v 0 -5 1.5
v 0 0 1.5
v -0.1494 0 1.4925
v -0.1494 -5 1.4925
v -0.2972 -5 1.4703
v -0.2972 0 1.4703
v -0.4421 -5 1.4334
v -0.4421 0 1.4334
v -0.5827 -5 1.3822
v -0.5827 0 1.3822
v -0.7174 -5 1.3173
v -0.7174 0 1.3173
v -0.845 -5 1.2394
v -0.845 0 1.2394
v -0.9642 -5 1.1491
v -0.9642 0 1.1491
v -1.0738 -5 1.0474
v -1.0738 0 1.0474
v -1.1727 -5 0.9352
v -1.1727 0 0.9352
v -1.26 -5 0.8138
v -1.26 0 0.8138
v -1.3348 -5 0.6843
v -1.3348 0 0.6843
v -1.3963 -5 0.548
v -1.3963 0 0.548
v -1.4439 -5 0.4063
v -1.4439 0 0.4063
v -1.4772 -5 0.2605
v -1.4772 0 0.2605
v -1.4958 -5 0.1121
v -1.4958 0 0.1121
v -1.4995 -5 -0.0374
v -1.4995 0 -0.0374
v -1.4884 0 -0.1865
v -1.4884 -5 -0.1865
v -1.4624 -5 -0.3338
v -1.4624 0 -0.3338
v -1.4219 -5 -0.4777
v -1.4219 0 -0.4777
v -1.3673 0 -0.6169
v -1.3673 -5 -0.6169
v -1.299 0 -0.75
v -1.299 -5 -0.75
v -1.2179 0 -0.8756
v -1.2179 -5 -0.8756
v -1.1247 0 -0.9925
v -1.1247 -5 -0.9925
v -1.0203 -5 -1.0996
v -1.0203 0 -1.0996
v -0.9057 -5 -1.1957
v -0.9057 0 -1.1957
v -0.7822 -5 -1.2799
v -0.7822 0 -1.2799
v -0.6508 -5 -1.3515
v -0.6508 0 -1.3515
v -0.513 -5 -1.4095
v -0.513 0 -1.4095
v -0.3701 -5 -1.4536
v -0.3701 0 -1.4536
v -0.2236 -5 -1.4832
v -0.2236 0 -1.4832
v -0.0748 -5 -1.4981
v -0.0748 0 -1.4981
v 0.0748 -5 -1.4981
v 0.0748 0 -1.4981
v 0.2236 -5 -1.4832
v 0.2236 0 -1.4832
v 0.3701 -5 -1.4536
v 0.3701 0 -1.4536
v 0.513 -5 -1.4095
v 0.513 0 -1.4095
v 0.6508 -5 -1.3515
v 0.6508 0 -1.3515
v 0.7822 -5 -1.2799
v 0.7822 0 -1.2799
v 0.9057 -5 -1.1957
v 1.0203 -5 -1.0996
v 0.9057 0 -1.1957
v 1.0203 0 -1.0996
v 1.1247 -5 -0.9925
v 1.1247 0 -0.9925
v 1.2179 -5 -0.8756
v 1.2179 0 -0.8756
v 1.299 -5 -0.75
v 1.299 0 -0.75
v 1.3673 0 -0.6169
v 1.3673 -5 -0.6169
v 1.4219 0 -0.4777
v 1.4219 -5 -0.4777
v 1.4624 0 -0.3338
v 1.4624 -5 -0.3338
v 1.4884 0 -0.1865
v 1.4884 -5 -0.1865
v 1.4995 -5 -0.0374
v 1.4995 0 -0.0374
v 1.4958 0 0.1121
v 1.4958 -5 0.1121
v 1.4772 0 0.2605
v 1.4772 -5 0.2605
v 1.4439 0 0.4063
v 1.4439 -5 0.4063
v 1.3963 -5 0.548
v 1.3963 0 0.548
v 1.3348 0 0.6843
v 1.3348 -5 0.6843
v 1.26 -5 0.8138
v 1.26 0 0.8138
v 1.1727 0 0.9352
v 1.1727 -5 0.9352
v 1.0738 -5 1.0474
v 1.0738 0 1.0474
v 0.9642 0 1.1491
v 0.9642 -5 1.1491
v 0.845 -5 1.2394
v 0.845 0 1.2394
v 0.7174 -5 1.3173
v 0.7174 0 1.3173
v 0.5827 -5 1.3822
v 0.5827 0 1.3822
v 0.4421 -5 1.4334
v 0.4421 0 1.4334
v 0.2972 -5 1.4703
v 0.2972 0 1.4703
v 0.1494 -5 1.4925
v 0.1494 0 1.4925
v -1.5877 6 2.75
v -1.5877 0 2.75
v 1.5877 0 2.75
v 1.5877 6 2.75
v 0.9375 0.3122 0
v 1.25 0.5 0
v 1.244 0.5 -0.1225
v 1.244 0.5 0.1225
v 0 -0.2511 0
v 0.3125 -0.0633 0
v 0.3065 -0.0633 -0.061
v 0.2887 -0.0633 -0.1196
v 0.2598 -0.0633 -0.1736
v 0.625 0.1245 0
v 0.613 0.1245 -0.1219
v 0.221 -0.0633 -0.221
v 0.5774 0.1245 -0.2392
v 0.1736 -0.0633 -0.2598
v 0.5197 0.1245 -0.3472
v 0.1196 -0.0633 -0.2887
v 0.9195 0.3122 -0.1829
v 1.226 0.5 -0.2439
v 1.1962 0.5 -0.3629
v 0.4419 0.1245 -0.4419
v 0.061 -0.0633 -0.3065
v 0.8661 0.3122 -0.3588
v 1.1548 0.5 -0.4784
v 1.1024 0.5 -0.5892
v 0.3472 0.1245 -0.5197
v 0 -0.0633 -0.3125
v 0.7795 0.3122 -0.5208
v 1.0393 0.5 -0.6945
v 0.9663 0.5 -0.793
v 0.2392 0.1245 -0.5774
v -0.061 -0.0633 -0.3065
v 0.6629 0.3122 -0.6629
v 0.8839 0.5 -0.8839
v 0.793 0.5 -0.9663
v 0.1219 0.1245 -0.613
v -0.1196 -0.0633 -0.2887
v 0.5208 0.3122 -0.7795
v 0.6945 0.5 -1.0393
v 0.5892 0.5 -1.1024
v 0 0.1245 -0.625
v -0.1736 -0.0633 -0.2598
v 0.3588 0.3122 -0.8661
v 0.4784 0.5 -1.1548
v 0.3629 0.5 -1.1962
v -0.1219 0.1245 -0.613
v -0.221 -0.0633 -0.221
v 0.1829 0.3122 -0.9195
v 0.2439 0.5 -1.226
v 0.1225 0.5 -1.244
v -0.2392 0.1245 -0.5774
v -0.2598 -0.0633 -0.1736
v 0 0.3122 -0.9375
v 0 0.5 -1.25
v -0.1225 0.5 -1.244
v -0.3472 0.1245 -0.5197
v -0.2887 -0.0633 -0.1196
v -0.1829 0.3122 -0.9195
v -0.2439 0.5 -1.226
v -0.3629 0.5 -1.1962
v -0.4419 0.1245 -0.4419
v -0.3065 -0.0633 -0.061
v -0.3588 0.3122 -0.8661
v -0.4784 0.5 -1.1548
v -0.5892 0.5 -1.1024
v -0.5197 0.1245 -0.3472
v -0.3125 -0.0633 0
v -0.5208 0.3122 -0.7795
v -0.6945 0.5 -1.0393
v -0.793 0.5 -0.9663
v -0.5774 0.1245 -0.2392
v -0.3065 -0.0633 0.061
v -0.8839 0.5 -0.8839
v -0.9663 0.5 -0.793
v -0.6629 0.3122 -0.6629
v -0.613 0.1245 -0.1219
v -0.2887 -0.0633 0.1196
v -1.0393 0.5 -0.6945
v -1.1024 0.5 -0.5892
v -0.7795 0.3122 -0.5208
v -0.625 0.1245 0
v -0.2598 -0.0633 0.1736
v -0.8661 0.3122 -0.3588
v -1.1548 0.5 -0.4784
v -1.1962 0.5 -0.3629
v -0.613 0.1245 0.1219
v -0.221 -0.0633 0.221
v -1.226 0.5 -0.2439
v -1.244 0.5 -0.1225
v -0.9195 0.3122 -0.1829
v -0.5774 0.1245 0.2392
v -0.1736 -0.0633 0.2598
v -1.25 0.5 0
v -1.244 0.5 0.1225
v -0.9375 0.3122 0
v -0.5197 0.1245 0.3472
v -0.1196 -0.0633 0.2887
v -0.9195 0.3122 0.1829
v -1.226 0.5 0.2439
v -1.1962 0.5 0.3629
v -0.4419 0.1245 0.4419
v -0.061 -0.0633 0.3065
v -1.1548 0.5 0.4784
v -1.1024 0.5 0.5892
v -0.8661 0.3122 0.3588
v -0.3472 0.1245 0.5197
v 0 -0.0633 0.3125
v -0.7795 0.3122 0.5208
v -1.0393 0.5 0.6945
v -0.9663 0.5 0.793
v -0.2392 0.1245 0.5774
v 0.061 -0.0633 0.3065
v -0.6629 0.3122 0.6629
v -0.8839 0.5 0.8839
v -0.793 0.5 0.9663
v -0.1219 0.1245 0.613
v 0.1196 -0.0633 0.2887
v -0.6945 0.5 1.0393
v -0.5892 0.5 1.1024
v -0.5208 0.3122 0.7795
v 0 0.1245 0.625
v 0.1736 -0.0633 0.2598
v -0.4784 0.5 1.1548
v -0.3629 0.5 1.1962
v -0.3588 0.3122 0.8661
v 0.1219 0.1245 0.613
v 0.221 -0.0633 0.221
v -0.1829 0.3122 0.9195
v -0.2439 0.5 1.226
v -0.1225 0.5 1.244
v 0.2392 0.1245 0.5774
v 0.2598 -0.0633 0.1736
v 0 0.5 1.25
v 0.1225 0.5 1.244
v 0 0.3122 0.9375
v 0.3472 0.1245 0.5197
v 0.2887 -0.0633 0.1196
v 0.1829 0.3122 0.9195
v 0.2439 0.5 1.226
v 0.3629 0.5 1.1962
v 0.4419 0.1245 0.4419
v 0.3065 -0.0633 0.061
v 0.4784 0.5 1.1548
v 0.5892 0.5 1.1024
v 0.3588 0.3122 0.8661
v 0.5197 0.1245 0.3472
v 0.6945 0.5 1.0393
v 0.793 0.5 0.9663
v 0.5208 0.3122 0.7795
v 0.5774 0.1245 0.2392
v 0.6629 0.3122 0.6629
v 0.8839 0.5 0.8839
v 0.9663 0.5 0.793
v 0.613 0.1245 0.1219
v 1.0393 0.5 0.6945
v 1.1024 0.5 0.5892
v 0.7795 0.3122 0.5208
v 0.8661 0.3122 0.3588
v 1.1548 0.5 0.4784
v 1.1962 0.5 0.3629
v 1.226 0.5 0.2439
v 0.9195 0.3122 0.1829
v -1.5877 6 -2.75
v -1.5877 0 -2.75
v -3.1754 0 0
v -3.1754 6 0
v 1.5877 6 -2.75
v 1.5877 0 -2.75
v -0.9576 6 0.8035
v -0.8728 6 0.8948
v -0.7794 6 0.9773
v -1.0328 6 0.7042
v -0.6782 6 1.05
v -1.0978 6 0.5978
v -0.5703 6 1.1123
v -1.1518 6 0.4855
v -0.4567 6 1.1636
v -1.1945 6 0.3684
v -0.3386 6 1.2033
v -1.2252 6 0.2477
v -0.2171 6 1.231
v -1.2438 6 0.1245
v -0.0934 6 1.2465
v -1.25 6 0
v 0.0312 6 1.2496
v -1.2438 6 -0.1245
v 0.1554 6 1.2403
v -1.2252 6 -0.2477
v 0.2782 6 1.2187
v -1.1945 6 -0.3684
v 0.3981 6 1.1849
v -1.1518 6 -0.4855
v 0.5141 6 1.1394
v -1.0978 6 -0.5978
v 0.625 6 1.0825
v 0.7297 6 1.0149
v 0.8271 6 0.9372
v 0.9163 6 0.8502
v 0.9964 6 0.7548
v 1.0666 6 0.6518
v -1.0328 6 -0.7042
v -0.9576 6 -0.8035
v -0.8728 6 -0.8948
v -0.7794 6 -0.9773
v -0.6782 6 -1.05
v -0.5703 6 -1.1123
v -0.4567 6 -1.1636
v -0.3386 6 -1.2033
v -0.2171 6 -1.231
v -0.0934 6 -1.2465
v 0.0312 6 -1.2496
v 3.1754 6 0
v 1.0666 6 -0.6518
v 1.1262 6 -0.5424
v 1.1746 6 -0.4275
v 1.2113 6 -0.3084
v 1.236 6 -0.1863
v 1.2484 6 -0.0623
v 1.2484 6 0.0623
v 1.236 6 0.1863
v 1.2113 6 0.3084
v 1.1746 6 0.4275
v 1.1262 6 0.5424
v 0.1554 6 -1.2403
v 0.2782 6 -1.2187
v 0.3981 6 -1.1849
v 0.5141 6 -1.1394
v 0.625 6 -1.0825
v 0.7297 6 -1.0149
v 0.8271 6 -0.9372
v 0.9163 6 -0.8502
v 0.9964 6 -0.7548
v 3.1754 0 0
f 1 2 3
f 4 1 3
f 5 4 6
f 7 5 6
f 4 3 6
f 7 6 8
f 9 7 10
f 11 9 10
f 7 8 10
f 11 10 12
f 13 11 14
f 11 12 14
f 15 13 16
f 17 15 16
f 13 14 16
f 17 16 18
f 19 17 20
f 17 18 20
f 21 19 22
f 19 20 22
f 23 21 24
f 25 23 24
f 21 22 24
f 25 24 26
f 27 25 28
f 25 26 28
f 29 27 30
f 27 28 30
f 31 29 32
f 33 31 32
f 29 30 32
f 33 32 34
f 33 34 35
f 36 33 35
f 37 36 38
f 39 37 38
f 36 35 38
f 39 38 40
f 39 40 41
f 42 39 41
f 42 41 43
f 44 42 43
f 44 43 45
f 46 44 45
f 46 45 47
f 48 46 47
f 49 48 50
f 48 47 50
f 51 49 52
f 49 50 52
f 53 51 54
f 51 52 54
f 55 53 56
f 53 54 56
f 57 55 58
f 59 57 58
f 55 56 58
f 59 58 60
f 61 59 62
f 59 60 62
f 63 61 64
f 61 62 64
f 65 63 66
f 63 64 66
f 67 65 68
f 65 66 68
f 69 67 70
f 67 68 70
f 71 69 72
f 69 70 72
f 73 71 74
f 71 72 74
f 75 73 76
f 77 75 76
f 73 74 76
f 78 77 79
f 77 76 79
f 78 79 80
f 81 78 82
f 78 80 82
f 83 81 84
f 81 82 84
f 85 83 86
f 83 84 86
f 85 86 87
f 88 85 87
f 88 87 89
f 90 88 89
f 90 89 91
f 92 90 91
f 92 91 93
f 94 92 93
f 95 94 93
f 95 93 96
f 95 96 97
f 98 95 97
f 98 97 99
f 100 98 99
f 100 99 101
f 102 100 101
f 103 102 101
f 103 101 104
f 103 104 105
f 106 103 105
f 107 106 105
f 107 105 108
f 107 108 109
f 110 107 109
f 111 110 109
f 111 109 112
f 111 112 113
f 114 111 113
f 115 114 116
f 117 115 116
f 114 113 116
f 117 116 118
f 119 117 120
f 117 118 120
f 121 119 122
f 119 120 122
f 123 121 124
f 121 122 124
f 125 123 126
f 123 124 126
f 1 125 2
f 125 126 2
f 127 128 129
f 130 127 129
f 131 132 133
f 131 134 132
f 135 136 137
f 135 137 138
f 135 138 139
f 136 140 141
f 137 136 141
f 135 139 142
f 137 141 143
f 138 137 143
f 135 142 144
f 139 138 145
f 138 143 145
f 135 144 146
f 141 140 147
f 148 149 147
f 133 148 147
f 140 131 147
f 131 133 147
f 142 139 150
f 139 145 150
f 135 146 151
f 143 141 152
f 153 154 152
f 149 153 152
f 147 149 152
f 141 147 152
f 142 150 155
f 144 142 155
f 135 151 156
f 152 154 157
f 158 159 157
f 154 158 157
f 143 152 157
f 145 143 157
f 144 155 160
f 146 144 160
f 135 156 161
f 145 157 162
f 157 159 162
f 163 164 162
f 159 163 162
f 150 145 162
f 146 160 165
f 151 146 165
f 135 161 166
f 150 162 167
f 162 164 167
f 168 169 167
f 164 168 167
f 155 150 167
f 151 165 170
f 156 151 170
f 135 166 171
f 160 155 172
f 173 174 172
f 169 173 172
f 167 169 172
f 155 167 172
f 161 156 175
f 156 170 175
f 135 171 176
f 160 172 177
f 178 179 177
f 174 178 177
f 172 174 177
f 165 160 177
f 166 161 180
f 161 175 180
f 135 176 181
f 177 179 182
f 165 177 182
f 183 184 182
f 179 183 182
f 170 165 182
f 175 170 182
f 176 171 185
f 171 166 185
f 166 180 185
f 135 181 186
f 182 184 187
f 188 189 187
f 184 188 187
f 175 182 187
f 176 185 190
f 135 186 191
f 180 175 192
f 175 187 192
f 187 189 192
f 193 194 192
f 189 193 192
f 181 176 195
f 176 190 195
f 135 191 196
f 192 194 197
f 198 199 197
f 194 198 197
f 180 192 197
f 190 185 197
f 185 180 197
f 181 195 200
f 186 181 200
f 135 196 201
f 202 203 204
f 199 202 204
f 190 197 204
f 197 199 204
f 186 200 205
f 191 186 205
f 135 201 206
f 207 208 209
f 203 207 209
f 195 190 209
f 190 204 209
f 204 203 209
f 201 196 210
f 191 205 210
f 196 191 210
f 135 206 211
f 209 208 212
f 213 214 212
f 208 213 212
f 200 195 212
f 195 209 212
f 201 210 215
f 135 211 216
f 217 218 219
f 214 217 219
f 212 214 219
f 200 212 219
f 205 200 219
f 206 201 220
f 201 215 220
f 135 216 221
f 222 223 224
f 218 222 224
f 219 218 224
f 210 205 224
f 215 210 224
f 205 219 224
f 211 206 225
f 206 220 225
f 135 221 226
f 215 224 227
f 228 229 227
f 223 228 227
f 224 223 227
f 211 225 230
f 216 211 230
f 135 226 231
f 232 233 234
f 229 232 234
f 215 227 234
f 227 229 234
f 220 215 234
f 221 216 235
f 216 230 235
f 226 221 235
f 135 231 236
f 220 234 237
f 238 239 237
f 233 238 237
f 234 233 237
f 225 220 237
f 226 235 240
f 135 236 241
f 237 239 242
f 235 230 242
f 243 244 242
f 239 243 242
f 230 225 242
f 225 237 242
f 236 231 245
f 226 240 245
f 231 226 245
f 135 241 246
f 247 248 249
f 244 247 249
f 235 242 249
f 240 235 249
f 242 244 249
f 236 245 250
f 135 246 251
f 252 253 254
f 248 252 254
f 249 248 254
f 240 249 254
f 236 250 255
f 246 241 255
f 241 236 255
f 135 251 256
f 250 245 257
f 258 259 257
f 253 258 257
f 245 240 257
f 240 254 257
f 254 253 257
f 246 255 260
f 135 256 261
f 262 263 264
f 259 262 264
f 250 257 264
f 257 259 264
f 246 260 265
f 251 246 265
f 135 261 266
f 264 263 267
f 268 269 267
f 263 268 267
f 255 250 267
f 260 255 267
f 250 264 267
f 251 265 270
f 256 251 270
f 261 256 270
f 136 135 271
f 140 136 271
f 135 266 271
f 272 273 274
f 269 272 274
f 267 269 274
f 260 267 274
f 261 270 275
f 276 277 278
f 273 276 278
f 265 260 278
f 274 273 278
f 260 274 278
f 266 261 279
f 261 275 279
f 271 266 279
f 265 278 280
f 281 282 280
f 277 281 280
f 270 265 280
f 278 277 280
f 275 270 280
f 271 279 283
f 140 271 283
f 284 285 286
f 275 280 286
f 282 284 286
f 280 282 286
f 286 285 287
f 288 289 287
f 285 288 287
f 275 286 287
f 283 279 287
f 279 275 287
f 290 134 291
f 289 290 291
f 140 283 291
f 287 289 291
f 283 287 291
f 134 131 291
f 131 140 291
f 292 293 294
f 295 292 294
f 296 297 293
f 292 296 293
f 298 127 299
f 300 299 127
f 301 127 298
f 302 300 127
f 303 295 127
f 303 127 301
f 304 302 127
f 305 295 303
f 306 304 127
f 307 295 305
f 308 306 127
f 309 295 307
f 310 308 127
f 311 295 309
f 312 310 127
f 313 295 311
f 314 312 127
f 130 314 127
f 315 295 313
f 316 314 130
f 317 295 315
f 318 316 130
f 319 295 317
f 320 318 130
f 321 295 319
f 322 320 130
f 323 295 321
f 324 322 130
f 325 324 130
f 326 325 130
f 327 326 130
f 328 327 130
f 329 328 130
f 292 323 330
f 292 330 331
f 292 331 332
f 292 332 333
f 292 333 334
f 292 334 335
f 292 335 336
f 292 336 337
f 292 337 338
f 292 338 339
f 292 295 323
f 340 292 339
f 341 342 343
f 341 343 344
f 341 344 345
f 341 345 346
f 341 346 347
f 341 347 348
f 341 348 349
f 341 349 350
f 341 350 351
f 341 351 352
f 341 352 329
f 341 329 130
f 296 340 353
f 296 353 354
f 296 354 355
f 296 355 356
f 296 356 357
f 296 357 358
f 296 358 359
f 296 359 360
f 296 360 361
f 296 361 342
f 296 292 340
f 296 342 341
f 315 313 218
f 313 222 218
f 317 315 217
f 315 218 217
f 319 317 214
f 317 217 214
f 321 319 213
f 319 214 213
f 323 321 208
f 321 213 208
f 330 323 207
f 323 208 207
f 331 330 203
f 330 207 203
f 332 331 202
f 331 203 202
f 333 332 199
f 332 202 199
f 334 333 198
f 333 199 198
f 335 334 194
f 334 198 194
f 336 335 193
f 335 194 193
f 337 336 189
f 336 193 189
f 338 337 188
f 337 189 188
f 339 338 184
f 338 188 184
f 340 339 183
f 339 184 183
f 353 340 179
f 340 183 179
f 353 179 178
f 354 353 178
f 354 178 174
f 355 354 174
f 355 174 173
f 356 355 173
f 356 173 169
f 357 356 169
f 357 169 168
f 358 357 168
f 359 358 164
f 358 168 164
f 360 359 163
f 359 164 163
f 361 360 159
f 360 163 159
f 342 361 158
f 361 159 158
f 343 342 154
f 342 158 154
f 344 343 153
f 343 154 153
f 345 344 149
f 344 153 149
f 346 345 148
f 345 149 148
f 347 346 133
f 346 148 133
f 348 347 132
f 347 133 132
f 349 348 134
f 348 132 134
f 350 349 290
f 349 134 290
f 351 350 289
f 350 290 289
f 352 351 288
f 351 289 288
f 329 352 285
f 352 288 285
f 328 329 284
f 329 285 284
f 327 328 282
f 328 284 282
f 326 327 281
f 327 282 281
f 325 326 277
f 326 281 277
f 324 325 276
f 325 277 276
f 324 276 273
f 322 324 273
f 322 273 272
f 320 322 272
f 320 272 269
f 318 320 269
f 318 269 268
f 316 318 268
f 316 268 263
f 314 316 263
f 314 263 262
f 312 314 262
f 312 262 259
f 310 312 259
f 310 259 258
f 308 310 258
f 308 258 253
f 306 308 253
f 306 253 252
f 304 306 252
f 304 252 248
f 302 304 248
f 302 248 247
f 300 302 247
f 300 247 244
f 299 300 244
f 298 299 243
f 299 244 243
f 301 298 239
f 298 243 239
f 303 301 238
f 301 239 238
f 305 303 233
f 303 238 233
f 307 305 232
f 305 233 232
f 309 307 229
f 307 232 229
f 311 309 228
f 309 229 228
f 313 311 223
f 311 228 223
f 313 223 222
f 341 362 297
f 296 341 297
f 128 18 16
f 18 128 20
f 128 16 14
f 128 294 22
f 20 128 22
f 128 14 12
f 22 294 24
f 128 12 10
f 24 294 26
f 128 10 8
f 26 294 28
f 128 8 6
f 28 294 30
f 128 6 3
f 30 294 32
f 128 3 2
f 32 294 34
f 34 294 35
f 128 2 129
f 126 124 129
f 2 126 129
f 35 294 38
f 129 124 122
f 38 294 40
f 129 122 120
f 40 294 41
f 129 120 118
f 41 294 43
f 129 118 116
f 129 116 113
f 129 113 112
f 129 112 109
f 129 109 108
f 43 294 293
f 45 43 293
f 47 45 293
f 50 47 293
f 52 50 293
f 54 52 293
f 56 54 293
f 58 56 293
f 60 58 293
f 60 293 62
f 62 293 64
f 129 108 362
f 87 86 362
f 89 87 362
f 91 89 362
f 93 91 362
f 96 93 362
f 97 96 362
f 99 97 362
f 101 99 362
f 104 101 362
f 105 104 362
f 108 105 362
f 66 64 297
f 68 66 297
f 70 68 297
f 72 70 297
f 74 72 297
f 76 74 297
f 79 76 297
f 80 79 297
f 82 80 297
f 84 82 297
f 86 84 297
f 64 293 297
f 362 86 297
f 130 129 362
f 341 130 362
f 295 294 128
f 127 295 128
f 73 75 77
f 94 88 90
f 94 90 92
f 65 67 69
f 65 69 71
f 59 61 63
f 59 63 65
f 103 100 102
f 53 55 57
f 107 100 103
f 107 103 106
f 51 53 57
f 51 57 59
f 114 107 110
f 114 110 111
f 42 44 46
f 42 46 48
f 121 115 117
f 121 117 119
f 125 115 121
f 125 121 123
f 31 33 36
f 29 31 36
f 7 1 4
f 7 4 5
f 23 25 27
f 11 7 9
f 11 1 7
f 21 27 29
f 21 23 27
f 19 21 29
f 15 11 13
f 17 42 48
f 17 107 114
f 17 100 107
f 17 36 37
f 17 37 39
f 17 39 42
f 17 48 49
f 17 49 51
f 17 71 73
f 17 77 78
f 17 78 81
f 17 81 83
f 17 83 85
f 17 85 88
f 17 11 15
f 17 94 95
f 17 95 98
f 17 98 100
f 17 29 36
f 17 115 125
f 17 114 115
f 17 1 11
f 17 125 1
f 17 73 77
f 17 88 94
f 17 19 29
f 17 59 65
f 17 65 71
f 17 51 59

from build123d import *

# Parameters (mm, degrees)
BOSS_EXTRUDE1_DEPTH       = 6
SKETCH2_R                 = 1.5
BOSS_EXTRUDE2_DEPTH       = 5
M3X0_5_TAPPED_HOLE1_D     = 2.5
M3X0_5_TAPPED_HOLE1_DEPTH = 5.5
M3X0_5_TAPPED_HOLE1_TIP   = 0.751075774


with BuildPart() as part:
    # Sketch1 → Boss-Extrude1 (new body)
    with BuildSketch(Plane(origin=(0, 0, 0), x_dir=(1, 0, 0), z_dir=(0, 1, 0))):
        Polygon((1.58771324, 2.75), (-1.58771324, 2.75), (-3.175426481, 0), (-1.58771324, -2.75), (1.58771324, -2.75), (3.175426481, 0), align=None)
    extrude(amount=BOSS_EXTRUDE1_DEPTH)

    # Sketch2 → Boss-Extrude2 (add)
    with BuildSketch(Plane.XZ):
        with Locations(Location((0, 0, 0), (0, 0, 90))):
            Circle(SKETCH2_R)
    extrude(amount=BOSS_EXTRUDE2_DEPTH)

    # M3x0.5 Tapped Hole1
    with Locations(Plane(origin=(0, 6, 0), x_dir=(1, 0, 0), z_dir=(0, 1, 0))):
        with Locations((0, 0)):
            Hole(M3X0_5_TAPPED_HOLE1_D / 2, depth=M3X0_5_TAPPED_HOLE1_DEPTH)
            with Locations((0, 0, -(M3X0_5_TAPPED_HOLE1_DEPTH + M3X0_5_TAPPED_HOLE1_TIP / 2))):  # 118° drill point
                Cone(0, M3X0_5_TAPPED_HOLE1_D / 2, M3X0_5_TAPPED_HOLE1_TIP, mode=Mode.SUBTRACT)


solid = part.part
